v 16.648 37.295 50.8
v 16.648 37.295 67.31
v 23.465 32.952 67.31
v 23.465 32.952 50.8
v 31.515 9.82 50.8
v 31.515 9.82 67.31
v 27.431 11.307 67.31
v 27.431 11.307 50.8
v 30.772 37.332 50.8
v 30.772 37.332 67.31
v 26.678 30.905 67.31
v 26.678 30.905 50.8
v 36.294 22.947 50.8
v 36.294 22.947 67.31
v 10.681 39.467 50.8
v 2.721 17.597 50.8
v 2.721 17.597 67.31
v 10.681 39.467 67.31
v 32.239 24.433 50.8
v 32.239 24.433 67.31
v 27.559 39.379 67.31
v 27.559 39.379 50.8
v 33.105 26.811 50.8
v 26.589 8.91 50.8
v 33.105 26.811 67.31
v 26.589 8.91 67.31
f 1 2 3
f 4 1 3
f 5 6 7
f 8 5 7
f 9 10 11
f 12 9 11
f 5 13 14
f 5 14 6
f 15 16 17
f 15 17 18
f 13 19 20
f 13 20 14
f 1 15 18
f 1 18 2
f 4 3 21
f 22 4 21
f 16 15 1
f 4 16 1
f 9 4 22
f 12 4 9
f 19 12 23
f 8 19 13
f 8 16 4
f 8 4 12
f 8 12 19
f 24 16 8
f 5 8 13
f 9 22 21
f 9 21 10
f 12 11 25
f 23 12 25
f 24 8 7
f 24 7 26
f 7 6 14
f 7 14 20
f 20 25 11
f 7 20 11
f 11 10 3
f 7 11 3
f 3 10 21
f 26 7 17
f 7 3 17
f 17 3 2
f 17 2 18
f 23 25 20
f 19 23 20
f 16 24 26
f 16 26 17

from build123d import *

# Parameters (mm, degrees)
SKETCH1_W      = 203.2
SKETCH1_H      = 101.6
EXTRUDE1_DEPTH = 50.8
EXTRUDE2_DEPTH = 16.51
SKETCH23_W     = 203.2
SKETCH23_H     = 50.8
EXTRUDE3_DEPTH = 508


with BuildPart() as part:
    # Sketch1 → Extrude1 (new body)
    with BuildSketch(Plane.XY):
        with Locations((101.6, 50.8)):
            Rectangle(SKETCH1_W, SKETCH1_H)
    extrude(amount=EXTRUDE1_DEPTH)

    # Sketch21 → Extrude2 (add)
    with BuildSketch(Plane.XY.offset(50.8)):
        Polygon((10.680914086, 39.466921448), (16.647962228, 37.295093538), (23.464694461, 32.952356157), (27.558917476, 39.378998974), (30.772238885, 37.331887466), (26.678015869, 30.905244649), (33.104658686, 26.811021633), (32.238976379, 24.432579042), (36.293520259, 22.947359397), (31.515498857, 9.819853485), (27.43078785, 11.306566707), (26.589174956, 8.909877207), (2.720982388, 17.597188848), align=None)
    extrude(amount=EXTRUDE2_DEPTH)

    # Sketch23 → Extrude3 (cut)
    with BuildSketch(Plane.XZ):
        with Locations((101.6, 25.4)):
            Rectangle(SKETCH23_W, SKETCH23_H)
    extrude(amount=-EXTRUDE3_DEPTH, mode=Mode.SUBTRACT)


solid = part.part
